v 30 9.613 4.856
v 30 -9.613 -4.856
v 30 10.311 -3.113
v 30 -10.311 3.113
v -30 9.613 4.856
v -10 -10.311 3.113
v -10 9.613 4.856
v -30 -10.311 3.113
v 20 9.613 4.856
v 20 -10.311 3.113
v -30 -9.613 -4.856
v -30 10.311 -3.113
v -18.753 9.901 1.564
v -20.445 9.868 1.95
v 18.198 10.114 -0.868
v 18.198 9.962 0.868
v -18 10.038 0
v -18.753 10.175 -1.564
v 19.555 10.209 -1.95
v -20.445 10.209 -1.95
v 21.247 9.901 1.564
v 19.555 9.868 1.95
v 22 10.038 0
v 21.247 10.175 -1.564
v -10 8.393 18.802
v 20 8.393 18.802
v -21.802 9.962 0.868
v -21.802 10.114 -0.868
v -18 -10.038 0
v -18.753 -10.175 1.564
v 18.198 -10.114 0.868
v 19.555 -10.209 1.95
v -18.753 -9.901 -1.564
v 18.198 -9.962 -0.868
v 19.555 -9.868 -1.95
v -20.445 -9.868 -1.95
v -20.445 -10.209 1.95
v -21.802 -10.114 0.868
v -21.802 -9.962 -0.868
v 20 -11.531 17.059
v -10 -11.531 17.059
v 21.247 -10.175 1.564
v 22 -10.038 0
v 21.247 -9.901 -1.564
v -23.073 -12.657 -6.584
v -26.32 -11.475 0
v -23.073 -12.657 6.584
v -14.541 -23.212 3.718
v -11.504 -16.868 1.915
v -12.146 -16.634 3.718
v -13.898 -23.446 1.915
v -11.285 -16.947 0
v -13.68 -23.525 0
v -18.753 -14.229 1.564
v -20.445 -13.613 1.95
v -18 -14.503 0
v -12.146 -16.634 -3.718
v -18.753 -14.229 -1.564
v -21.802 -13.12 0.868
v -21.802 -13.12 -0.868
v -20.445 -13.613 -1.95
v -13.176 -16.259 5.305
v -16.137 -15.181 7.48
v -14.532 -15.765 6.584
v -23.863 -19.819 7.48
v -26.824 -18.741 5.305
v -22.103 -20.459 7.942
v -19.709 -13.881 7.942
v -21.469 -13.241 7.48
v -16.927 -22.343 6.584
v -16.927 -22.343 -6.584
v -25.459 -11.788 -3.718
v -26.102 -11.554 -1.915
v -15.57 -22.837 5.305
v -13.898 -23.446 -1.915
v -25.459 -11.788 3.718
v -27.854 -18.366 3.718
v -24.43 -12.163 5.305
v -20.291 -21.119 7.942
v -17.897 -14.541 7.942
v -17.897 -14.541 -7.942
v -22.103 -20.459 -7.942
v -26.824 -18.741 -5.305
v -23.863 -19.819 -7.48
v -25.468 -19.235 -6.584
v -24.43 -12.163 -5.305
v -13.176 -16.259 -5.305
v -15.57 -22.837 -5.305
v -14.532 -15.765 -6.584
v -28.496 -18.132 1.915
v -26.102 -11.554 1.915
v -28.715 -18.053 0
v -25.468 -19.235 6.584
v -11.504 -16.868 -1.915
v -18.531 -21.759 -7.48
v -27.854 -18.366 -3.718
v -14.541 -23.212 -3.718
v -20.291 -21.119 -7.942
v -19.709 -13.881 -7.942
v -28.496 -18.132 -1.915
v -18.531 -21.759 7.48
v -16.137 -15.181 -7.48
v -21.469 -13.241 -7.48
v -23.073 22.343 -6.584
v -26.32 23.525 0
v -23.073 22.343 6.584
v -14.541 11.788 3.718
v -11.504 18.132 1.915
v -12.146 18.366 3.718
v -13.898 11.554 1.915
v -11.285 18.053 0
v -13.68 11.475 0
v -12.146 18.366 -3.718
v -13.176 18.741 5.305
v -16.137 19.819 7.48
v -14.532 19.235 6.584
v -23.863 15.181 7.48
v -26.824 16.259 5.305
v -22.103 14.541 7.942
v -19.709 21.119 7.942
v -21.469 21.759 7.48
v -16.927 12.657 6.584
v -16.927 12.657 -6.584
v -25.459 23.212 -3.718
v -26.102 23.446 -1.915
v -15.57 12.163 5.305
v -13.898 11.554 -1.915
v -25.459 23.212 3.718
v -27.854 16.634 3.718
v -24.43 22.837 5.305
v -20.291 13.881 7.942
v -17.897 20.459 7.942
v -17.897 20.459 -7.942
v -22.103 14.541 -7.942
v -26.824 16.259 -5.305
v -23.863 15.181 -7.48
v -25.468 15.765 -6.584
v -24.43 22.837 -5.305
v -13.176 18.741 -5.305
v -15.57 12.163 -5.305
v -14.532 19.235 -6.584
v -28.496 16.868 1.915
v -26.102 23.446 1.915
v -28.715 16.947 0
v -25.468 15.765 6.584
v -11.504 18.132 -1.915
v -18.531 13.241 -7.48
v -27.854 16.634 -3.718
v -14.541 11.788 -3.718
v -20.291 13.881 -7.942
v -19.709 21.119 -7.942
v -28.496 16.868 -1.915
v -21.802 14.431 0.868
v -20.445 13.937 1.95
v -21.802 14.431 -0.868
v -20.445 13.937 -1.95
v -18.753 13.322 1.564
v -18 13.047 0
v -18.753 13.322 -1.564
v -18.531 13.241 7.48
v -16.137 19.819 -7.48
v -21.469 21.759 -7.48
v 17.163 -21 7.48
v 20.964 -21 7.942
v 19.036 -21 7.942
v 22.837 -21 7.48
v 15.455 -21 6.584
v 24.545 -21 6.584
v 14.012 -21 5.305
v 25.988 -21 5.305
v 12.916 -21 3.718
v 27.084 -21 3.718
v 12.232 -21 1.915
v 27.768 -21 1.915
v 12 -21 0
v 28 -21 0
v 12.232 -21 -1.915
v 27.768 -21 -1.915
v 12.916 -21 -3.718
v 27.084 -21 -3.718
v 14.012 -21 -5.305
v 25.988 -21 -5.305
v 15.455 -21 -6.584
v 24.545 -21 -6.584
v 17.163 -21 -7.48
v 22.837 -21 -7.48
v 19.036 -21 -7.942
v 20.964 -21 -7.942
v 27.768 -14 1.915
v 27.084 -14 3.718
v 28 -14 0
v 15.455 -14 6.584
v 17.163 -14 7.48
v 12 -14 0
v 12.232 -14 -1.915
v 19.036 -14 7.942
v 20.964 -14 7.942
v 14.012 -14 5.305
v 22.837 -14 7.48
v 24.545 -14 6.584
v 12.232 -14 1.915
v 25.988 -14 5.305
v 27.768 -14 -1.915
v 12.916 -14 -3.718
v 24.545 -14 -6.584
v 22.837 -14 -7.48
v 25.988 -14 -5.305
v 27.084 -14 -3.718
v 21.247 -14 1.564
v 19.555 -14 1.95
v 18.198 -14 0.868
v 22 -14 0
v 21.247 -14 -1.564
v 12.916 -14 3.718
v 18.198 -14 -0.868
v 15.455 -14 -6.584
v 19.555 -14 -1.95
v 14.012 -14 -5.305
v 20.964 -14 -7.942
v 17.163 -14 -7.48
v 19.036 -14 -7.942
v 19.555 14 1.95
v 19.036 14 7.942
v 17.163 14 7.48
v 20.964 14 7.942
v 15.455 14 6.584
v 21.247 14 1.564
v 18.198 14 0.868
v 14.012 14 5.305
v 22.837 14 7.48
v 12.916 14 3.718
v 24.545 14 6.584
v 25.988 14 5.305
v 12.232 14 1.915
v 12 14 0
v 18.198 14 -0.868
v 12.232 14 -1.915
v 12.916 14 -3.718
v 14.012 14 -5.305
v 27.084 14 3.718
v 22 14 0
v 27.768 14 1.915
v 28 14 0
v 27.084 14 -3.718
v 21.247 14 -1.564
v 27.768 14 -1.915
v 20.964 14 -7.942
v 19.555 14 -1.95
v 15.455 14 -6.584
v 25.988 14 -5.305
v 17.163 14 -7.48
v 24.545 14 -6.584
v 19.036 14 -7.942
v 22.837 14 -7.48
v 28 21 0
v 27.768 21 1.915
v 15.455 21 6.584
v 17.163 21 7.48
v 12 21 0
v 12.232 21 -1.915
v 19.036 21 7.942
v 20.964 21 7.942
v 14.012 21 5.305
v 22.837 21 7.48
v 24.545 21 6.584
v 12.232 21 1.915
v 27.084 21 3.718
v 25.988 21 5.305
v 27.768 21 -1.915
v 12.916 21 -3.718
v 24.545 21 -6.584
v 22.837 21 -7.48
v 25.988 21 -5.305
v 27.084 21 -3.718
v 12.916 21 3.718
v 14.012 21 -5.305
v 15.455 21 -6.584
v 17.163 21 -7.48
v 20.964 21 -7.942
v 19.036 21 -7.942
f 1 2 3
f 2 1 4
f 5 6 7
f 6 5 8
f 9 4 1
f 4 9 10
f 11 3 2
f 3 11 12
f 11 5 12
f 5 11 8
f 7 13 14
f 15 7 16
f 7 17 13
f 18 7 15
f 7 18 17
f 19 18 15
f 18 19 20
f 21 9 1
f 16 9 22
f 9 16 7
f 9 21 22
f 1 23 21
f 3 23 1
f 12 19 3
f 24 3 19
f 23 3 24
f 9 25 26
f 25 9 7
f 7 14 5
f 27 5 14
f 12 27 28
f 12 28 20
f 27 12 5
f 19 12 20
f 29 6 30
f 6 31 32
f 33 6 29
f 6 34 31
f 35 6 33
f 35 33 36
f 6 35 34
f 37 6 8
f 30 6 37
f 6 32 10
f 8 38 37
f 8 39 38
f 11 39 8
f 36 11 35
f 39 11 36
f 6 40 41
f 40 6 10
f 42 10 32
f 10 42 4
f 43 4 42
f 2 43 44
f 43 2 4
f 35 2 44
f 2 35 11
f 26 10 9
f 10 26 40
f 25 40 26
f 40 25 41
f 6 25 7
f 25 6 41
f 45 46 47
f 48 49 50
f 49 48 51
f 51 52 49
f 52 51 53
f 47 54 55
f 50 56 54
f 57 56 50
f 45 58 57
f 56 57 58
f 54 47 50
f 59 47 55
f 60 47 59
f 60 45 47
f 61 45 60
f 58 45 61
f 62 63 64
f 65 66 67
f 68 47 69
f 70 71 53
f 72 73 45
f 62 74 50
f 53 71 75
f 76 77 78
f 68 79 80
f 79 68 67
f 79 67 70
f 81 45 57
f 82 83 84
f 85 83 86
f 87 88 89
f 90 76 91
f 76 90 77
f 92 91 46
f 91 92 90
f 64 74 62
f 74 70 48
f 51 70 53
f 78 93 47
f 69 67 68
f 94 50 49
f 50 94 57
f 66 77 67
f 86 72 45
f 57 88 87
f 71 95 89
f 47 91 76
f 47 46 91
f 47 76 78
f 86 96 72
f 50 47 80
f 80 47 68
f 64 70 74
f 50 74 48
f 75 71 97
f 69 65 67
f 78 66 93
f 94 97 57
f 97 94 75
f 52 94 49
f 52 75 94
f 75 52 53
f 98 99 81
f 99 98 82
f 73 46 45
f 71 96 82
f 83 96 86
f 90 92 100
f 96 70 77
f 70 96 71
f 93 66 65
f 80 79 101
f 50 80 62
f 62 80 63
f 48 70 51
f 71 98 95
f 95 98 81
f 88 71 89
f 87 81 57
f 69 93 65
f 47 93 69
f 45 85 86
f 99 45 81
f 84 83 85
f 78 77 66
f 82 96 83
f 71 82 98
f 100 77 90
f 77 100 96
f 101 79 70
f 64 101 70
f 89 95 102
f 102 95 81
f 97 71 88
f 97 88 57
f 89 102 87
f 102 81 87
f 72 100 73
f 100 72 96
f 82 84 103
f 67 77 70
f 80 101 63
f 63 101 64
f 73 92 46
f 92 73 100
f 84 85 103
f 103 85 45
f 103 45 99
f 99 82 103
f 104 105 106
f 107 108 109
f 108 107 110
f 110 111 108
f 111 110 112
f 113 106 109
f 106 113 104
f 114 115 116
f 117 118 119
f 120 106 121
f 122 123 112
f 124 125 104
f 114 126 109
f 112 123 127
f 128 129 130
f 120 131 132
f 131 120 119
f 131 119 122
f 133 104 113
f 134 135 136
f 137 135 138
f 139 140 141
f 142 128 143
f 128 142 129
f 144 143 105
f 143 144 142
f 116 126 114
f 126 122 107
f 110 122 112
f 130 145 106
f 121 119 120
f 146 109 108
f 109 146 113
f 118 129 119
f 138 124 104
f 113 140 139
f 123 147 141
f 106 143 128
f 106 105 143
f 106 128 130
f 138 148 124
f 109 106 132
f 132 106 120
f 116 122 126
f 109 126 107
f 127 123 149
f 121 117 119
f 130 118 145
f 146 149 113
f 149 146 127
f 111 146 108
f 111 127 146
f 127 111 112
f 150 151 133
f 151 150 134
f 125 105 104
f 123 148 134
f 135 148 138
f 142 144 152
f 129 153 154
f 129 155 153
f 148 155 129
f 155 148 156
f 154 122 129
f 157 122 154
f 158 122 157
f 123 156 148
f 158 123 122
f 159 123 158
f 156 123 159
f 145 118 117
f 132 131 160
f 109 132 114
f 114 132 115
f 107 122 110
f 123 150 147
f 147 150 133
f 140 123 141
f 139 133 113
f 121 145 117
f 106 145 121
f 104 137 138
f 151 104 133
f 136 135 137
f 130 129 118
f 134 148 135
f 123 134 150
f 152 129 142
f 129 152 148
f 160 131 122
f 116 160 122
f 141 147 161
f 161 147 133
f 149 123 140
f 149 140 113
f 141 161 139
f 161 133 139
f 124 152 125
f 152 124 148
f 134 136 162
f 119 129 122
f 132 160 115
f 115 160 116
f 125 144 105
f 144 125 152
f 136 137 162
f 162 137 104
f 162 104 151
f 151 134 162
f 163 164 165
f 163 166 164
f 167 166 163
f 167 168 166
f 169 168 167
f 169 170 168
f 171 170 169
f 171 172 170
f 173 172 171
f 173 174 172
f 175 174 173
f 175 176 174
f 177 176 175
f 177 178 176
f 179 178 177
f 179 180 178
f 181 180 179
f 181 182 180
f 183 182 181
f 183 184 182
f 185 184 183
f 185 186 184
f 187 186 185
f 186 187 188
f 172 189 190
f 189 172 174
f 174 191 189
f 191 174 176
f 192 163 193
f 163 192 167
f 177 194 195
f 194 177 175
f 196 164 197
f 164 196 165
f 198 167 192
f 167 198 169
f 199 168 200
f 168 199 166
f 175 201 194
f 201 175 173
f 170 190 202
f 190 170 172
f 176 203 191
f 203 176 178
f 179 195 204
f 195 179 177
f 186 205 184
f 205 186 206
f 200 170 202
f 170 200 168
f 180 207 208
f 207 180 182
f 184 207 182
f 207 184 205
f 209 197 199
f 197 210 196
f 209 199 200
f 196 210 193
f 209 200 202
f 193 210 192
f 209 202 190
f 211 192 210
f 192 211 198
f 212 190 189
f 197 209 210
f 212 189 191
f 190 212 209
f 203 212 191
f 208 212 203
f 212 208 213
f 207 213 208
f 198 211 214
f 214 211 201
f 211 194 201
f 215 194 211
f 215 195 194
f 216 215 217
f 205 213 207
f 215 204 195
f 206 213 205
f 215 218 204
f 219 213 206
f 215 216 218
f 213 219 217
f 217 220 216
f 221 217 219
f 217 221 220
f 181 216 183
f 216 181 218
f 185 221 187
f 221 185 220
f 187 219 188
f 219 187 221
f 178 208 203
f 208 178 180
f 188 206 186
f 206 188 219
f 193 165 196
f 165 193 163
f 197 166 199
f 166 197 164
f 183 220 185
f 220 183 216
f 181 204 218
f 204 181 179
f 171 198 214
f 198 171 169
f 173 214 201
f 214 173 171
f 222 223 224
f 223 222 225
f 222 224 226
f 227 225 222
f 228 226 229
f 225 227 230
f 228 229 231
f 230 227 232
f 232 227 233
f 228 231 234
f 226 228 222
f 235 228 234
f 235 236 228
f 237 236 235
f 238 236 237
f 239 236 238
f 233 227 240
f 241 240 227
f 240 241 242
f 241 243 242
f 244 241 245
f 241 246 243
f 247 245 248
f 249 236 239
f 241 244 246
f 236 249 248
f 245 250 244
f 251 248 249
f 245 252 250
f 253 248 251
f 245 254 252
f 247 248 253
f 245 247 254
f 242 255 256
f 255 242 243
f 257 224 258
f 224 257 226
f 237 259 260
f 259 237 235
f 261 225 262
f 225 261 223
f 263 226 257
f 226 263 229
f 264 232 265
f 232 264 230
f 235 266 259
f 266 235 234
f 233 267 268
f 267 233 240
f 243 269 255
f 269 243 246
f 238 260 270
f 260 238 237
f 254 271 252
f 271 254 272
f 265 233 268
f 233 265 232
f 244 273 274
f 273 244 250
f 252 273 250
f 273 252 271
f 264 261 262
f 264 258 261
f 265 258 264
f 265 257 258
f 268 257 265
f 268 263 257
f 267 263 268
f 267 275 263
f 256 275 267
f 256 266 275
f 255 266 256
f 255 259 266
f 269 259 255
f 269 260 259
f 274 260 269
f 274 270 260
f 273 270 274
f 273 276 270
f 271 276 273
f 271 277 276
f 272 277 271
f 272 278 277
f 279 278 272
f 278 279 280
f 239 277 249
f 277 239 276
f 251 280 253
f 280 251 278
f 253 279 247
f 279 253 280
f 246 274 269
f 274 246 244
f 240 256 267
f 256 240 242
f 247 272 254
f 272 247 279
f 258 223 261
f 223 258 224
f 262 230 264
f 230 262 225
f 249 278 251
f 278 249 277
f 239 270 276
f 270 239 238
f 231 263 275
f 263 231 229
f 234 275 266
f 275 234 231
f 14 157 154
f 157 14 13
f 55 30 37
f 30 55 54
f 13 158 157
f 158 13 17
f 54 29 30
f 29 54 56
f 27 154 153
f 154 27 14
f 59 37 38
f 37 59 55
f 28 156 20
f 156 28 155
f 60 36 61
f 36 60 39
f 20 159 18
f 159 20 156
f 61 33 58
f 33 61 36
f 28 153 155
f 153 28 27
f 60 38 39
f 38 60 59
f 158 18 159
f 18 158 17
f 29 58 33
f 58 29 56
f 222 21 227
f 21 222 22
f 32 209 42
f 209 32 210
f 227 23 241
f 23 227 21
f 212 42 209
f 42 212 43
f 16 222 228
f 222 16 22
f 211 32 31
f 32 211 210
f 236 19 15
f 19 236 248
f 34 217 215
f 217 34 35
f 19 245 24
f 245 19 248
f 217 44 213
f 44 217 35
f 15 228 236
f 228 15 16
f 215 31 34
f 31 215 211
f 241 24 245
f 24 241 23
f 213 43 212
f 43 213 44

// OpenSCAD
// Chapter Two

// https://openscad.org/documentation.html#tutorial
// https://en.wikibooks.org/wiki/OpenSCAD_Tutorial/Chapter_2

// Challendge 

/*

Exercise
========
Try using a wheelWidth variable 
to parameterise the width of the wheels, 

a wheelsTurn variable 
to parameterise the rotation of the front wheels 
around the Z axis 

and a bodyRoll or turnBody variable 
to parameterise the rotation of the body 
around the X axis. 

Experiment with assigning different values to 
wheelRadius, 
baseHeight, 
topHeight, 
track, 
wheelWidth, 
wheelsTurn and 
bodyRoll / turnBody 

to create a version of the car 
that you like.

By now it should be clear to you 
that parameterising your models 
unlocks the power of 
reusing, customising and iterating your designs 
as well as that of 
effortlessly exploring different possibilities.

*/



// resolution settings
// $fa = 1;
// $fs = 0.4;


/* PARAMETERS */
/* PARAMETERS */
/* PARAMETERS */
wheelsTurn = [0,0,-20]; // z [degrees]

// turnBody = [0,0,0];
turnBody = [-wheelsTurn.z/4,0,0]; // x [degrees]

// wheel radius
wheelRadius = 8;
// wheel width
wheelWidth = 7;
// axel radius
axleRadius = 2;

// baseHeight = 10;
// topHeight = 10;
baseHeight = 8;
topHeight = 14;

track = 35; // wheel distance

// Car body base
rotate(turnBody) {
    cube([ 60, 20, baseHeight ], center = true);

    // Car body top
    translate([ 5, 0, (baseHeight+topHeight)/2 - 0.001 ]) 
        cube([ 30, 20, topHeight ], center = true);
}

// Front left wheel
translate([ -20, -track/2, 0 ]) 
rotate([ 90, 0, 0 ]+wheelsTurn)
    cylinder(h = wheelWidth, r = wheelRadius, center = true);

// Front right wheel
translate([ -20, track/2, 0 ]) 
rotate([ 90, 0, 0 ]+wheelsTurn)
    cylinder(h = wheelWidth, r = wheelRadius, center = true);

// wheelRadius = 10;

// Rear left wheel
translate([ 20, -track/2, 0 ]) rotate([ 90, 0, 0 ])
    cylinder(h = wheelWidth, r = wheelRadius, center = true);

// Rear right wheel
translate([ 20, track/2, 0 ]) rotate([ 90, 0, 0 ])
    cylinder(h = wheelWidth, r = wheelRadius, center = true);

// wheelRadius = 15;

// Front axle
translate([ -20, 0, 0 ]) rotate([ 90, 0, 0 ])
    cylinder(h = track, r = axleRadius, center = true);

// Rear axle
translate([ 20, 0, 0 ]) rotate([ 90, 0, 0 ])
    cylinder(h = track, r = axleRadius, center = true);

// wheelRadius = 20;
